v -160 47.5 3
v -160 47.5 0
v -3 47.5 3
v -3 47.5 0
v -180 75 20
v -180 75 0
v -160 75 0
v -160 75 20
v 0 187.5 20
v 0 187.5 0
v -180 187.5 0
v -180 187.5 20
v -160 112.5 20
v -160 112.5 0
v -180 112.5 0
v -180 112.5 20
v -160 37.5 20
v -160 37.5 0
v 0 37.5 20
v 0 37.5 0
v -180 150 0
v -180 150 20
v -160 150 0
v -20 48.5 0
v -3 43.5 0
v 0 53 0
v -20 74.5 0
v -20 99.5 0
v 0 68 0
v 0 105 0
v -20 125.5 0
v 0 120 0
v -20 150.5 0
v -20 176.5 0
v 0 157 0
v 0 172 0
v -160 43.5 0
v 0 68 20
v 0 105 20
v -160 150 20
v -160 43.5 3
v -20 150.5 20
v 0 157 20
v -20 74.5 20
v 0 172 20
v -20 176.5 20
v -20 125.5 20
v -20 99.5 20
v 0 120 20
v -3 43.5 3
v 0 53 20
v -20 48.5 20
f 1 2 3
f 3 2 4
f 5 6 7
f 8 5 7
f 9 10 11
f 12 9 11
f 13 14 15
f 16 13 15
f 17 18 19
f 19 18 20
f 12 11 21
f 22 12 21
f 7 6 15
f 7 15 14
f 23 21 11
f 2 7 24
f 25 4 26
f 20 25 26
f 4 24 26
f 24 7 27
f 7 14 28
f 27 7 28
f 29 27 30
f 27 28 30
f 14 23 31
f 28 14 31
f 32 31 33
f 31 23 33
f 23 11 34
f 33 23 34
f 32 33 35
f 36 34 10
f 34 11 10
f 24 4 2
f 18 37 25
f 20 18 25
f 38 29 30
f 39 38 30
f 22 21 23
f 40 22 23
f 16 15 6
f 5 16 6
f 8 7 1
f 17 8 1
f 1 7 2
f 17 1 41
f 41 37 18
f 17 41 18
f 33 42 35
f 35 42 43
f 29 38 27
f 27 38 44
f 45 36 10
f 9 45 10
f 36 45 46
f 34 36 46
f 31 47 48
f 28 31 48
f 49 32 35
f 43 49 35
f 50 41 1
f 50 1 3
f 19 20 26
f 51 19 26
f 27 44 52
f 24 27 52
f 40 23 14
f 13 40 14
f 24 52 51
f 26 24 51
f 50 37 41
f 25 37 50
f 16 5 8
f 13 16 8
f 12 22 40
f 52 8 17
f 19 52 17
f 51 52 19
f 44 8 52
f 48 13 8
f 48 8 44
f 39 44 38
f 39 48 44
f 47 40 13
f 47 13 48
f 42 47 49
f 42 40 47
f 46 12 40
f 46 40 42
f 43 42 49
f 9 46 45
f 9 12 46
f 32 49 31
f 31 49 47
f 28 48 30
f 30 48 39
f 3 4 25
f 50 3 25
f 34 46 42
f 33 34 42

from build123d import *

# Parameters (mm, degrees)
F1_DEPTH = 20
F3_DEPTH = 20
F4_W     = 157
F4_H     = 4
F5_DEPTH = 3


with BuildPart() as f1:
    # F0 (on Top) → F1 (new body)
    with BuildSketch(Plane.XY):
        Polygon((0, 187.499995), (-180, 187.499995), (-180, 149.999995), (-160, 149.999995), (-160, 112.499995), (-180, 112.499995), (-180, 74.999995), (-160, 74.999995), (-160, 37.499995), (0, 37.499995), align=None)
    extrude(amount=F1_DEPTH)

    # F2 (on face) → F3 (cut)
    with BuildSketch(Plane.XY.offset(20)):
        Polygon((0, 171.999995), (-20, 176.499995), (-20, 150.499995), (0, 156.999995), align=None)
        Polygon((0, 119.999995), (-20, 125.499995), (-20, 99.499995), (0, 104.999995), align=None)
        Polygon((0, 67.999995), (-20, 74.499995), (-20, 48.499995), (0, 52.999995), align=None)
    extrude(amount=-F3_DEPTH, mode=Mode.SUBTRACT)

    # F4 (on face) → F5 (cut)
    with BuildSketch(Plane(origin=(0, 0, 0), x_dir=(1, 0, 0), z_dir=(0, 0, -1))):
        with Locations((-81.5, -45.499995)):
            Rectangle(F4_W, F4_H)
    extrude(amount=-F5_DEPTH, mode=Mode.SUBTRACT)


solid = f1.part
